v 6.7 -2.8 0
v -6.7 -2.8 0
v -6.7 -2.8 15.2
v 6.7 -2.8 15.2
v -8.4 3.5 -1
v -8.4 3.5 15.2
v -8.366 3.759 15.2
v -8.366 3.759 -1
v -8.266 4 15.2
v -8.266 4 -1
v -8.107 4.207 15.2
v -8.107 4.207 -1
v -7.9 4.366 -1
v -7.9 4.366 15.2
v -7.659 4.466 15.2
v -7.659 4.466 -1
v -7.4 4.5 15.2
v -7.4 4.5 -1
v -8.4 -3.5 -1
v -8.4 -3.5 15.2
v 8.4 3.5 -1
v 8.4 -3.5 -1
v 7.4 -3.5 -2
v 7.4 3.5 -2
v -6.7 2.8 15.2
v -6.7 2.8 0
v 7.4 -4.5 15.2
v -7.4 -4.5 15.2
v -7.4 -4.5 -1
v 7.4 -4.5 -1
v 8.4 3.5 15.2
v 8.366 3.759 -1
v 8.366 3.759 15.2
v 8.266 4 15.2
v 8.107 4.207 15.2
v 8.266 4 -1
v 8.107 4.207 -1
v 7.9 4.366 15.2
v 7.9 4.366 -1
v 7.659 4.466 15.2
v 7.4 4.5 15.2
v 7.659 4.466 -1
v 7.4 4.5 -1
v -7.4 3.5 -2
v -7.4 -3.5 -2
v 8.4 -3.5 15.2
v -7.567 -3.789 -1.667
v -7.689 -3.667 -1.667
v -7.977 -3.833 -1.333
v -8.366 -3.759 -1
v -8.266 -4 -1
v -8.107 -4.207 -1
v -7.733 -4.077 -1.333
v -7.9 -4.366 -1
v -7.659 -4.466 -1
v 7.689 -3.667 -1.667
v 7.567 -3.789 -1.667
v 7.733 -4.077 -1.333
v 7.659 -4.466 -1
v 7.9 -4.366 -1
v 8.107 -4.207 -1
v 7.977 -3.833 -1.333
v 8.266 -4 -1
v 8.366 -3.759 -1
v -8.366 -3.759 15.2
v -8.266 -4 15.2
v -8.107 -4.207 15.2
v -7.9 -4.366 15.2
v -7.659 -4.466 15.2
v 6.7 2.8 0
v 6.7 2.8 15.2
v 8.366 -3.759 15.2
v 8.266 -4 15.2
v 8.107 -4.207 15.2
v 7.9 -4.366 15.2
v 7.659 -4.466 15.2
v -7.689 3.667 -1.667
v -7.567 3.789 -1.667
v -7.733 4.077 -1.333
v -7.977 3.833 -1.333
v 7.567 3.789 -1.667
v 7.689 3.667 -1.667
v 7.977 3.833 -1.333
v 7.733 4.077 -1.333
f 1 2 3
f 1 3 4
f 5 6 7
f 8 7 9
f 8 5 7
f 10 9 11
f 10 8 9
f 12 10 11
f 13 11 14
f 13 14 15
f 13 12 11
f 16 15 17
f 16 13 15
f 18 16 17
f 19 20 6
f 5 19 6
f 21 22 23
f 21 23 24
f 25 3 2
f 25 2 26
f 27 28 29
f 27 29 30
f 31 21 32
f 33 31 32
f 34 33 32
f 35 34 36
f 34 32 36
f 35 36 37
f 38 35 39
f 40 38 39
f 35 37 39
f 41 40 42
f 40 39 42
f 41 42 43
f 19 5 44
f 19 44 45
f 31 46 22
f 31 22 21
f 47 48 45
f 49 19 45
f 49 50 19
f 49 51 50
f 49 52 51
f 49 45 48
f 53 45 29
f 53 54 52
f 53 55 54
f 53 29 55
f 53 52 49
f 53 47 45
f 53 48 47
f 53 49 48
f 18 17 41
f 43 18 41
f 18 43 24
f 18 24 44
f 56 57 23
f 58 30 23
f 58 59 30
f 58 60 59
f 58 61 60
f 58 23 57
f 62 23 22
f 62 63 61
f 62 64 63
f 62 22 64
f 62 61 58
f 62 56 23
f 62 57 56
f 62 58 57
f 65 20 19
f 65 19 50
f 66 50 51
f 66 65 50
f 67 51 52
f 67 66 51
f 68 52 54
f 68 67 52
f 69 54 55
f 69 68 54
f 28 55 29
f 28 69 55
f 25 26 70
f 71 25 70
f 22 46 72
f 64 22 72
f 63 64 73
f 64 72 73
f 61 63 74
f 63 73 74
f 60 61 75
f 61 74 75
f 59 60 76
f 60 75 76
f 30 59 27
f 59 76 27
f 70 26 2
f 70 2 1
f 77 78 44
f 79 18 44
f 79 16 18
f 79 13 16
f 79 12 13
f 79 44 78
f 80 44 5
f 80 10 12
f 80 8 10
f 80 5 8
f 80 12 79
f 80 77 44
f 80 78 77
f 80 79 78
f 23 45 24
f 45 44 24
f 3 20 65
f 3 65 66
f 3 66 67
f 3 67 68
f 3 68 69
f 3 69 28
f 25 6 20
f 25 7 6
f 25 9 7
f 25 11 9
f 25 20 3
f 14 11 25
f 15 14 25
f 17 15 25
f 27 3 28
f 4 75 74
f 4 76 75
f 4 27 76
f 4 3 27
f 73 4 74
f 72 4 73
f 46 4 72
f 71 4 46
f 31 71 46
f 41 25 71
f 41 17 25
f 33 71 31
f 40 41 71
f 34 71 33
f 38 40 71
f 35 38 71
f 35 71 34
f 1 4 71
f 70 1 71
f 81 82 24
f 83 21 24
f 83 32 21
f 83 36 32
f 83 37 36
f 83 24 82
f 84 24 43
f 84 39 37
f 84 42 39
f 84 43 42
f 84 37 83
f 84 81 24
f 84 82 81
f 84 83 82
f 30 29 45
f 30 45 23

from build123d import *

# Parameters (mm, degrees)
F0_W     = 16.8
F0_H     = 9
F0_W_2   = 13.4
F0_H_2   = 5.6
F1_DEPTH = 15.2
F2_DEPTH = 2
F3_R     = 1
F4_SIZE  = 1


with BuildPart() as f1:
    # F0 (on Top) → F1 (new body)
    with BuildSketch(Plane.XY):
        Rectangle(F0_W, F0_H)
        Rectangle(F0_W_2, F0_H_2, mode=Mode.SUBTRACT)
    extrude(amount=F1_DEPTH)

    # F0 (on Top) → F2 (join)
    with BuildSketch(Plane.XY):
        Rectangle(F0_W, F0_H)
        Rectangle(F0_W_2, F0_H_2, mode=Mode.SUBTRACT)
        Rectangle(F0_W_2, F0_H_2)
    extrude(amount=-F2_DEPTH)

    # F3
    f3_edges = [f1.edges().sort_by_distance(p)[0] for p in [
        (-8.4, 4.5, 6.6),
        (-8.4, -4.5, 6.6),
        (8.4, -4.5, 6.6),
        (8.4, 4.5, 6.6),
    ]]
    fillet(f3_edges, radius=F3_R)

    # F4
    f4_edges = [f1.edges().sort_by_distance(p)[0] for p in [
        (0, -4.5, -2),
        (-8.107107, -4.207107, -2),
        (8.107107, -4.207107, -2),
        (-8.4, 0, -2),
        (8.4, 0, -2),
        (-8.107107, 4.207107, -2),
        (8.107107, 4.207107, -2),
        (0, 4.5, -2),
    ]]
    chamfer(f4_edges, length=F4_SIZE)


solid = f1.part
